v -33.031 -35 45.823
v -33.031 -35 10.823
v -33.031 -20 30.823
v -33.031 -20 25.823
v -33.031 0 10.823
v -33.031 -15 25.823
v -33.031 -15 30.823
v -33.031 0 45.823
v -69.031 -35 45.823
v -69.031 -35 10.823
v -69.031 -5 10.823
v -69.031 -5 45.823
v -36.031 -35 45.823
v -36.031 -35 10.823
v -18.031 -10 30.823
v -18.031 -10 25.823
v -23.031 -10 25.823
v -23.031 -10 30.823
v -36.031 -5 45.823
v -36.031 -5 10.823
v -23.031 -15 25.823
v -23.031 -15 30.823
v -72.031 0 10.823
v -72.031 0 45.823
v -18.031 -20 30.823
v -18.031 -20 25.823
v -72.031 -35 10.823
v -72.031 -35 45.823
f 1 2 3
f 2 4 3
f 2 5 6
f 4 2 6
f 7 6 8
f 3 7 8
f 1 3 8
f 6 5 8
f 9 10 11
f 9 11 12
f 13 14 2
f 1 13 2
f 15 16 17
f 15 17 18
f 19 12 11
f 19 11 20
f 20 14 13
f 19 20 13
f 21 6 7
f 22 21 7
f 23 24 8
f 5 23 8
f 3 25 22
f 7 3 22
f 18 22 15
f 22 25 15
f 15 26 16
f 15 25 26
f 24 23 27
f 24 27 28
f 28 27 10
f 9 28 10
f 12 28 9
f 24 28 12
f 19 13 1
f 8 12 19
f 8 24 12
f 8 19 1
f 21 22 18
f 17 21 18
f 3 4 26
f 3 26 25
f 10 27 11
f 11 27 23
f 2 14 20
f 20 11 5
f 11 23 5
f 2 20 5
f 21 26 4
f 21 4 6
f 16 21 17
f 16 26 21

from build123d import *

# Parameters (mm, degrees)
F0_W     = 39
F0_H     = 35
F1_DEPTH = 35
F2_W     = 33
F2_H     = 35
F3_DEPTH = 30
F4_W     = 5
F4_H     = 5
F5_DEPTH = 15
F6_W     = 5
F6_H     = 5
F7_DEPTH = 5


with BuildPart() as f1:
    # F0 (on Front) → F1 (new body)
    with BuildSketch(Plane.XZ):
        with Locations((-52.531138, 28.322564)):
            Rectangle(F0_W, F0_H)
    extrude(amount=F1_DEPTH)

    # F2 (on face) → F3 (cut)
    with BuildSketch(Plane.XZ.offset(35)):
        with Locations((-52.531138, 28.322564)):
            Rectangle(F2_W, F2_H)
    extrude(amount=-F3_DEPTH, mode=Mode.SUBTRACT)

    # F4 (on face) → F5 (join)
    with BuildSketch(Plane.YZ.offset(-33.031138)):
        with Locations((-17.5, 28.322564)):
            Rectangle(F4_W, F4_H)
    extrude(amount=F5_DEPTH)

    # F6 (on face) → F7 (join)
    with BuildSketch(Plane.YZ.offset(-18.031138)):
        with Locations((-12.5, 28.322564)):
            Rectangle(F6_W, F6_H)
    extrude(amount=-F7_DEPTH)


solid = f1.part
